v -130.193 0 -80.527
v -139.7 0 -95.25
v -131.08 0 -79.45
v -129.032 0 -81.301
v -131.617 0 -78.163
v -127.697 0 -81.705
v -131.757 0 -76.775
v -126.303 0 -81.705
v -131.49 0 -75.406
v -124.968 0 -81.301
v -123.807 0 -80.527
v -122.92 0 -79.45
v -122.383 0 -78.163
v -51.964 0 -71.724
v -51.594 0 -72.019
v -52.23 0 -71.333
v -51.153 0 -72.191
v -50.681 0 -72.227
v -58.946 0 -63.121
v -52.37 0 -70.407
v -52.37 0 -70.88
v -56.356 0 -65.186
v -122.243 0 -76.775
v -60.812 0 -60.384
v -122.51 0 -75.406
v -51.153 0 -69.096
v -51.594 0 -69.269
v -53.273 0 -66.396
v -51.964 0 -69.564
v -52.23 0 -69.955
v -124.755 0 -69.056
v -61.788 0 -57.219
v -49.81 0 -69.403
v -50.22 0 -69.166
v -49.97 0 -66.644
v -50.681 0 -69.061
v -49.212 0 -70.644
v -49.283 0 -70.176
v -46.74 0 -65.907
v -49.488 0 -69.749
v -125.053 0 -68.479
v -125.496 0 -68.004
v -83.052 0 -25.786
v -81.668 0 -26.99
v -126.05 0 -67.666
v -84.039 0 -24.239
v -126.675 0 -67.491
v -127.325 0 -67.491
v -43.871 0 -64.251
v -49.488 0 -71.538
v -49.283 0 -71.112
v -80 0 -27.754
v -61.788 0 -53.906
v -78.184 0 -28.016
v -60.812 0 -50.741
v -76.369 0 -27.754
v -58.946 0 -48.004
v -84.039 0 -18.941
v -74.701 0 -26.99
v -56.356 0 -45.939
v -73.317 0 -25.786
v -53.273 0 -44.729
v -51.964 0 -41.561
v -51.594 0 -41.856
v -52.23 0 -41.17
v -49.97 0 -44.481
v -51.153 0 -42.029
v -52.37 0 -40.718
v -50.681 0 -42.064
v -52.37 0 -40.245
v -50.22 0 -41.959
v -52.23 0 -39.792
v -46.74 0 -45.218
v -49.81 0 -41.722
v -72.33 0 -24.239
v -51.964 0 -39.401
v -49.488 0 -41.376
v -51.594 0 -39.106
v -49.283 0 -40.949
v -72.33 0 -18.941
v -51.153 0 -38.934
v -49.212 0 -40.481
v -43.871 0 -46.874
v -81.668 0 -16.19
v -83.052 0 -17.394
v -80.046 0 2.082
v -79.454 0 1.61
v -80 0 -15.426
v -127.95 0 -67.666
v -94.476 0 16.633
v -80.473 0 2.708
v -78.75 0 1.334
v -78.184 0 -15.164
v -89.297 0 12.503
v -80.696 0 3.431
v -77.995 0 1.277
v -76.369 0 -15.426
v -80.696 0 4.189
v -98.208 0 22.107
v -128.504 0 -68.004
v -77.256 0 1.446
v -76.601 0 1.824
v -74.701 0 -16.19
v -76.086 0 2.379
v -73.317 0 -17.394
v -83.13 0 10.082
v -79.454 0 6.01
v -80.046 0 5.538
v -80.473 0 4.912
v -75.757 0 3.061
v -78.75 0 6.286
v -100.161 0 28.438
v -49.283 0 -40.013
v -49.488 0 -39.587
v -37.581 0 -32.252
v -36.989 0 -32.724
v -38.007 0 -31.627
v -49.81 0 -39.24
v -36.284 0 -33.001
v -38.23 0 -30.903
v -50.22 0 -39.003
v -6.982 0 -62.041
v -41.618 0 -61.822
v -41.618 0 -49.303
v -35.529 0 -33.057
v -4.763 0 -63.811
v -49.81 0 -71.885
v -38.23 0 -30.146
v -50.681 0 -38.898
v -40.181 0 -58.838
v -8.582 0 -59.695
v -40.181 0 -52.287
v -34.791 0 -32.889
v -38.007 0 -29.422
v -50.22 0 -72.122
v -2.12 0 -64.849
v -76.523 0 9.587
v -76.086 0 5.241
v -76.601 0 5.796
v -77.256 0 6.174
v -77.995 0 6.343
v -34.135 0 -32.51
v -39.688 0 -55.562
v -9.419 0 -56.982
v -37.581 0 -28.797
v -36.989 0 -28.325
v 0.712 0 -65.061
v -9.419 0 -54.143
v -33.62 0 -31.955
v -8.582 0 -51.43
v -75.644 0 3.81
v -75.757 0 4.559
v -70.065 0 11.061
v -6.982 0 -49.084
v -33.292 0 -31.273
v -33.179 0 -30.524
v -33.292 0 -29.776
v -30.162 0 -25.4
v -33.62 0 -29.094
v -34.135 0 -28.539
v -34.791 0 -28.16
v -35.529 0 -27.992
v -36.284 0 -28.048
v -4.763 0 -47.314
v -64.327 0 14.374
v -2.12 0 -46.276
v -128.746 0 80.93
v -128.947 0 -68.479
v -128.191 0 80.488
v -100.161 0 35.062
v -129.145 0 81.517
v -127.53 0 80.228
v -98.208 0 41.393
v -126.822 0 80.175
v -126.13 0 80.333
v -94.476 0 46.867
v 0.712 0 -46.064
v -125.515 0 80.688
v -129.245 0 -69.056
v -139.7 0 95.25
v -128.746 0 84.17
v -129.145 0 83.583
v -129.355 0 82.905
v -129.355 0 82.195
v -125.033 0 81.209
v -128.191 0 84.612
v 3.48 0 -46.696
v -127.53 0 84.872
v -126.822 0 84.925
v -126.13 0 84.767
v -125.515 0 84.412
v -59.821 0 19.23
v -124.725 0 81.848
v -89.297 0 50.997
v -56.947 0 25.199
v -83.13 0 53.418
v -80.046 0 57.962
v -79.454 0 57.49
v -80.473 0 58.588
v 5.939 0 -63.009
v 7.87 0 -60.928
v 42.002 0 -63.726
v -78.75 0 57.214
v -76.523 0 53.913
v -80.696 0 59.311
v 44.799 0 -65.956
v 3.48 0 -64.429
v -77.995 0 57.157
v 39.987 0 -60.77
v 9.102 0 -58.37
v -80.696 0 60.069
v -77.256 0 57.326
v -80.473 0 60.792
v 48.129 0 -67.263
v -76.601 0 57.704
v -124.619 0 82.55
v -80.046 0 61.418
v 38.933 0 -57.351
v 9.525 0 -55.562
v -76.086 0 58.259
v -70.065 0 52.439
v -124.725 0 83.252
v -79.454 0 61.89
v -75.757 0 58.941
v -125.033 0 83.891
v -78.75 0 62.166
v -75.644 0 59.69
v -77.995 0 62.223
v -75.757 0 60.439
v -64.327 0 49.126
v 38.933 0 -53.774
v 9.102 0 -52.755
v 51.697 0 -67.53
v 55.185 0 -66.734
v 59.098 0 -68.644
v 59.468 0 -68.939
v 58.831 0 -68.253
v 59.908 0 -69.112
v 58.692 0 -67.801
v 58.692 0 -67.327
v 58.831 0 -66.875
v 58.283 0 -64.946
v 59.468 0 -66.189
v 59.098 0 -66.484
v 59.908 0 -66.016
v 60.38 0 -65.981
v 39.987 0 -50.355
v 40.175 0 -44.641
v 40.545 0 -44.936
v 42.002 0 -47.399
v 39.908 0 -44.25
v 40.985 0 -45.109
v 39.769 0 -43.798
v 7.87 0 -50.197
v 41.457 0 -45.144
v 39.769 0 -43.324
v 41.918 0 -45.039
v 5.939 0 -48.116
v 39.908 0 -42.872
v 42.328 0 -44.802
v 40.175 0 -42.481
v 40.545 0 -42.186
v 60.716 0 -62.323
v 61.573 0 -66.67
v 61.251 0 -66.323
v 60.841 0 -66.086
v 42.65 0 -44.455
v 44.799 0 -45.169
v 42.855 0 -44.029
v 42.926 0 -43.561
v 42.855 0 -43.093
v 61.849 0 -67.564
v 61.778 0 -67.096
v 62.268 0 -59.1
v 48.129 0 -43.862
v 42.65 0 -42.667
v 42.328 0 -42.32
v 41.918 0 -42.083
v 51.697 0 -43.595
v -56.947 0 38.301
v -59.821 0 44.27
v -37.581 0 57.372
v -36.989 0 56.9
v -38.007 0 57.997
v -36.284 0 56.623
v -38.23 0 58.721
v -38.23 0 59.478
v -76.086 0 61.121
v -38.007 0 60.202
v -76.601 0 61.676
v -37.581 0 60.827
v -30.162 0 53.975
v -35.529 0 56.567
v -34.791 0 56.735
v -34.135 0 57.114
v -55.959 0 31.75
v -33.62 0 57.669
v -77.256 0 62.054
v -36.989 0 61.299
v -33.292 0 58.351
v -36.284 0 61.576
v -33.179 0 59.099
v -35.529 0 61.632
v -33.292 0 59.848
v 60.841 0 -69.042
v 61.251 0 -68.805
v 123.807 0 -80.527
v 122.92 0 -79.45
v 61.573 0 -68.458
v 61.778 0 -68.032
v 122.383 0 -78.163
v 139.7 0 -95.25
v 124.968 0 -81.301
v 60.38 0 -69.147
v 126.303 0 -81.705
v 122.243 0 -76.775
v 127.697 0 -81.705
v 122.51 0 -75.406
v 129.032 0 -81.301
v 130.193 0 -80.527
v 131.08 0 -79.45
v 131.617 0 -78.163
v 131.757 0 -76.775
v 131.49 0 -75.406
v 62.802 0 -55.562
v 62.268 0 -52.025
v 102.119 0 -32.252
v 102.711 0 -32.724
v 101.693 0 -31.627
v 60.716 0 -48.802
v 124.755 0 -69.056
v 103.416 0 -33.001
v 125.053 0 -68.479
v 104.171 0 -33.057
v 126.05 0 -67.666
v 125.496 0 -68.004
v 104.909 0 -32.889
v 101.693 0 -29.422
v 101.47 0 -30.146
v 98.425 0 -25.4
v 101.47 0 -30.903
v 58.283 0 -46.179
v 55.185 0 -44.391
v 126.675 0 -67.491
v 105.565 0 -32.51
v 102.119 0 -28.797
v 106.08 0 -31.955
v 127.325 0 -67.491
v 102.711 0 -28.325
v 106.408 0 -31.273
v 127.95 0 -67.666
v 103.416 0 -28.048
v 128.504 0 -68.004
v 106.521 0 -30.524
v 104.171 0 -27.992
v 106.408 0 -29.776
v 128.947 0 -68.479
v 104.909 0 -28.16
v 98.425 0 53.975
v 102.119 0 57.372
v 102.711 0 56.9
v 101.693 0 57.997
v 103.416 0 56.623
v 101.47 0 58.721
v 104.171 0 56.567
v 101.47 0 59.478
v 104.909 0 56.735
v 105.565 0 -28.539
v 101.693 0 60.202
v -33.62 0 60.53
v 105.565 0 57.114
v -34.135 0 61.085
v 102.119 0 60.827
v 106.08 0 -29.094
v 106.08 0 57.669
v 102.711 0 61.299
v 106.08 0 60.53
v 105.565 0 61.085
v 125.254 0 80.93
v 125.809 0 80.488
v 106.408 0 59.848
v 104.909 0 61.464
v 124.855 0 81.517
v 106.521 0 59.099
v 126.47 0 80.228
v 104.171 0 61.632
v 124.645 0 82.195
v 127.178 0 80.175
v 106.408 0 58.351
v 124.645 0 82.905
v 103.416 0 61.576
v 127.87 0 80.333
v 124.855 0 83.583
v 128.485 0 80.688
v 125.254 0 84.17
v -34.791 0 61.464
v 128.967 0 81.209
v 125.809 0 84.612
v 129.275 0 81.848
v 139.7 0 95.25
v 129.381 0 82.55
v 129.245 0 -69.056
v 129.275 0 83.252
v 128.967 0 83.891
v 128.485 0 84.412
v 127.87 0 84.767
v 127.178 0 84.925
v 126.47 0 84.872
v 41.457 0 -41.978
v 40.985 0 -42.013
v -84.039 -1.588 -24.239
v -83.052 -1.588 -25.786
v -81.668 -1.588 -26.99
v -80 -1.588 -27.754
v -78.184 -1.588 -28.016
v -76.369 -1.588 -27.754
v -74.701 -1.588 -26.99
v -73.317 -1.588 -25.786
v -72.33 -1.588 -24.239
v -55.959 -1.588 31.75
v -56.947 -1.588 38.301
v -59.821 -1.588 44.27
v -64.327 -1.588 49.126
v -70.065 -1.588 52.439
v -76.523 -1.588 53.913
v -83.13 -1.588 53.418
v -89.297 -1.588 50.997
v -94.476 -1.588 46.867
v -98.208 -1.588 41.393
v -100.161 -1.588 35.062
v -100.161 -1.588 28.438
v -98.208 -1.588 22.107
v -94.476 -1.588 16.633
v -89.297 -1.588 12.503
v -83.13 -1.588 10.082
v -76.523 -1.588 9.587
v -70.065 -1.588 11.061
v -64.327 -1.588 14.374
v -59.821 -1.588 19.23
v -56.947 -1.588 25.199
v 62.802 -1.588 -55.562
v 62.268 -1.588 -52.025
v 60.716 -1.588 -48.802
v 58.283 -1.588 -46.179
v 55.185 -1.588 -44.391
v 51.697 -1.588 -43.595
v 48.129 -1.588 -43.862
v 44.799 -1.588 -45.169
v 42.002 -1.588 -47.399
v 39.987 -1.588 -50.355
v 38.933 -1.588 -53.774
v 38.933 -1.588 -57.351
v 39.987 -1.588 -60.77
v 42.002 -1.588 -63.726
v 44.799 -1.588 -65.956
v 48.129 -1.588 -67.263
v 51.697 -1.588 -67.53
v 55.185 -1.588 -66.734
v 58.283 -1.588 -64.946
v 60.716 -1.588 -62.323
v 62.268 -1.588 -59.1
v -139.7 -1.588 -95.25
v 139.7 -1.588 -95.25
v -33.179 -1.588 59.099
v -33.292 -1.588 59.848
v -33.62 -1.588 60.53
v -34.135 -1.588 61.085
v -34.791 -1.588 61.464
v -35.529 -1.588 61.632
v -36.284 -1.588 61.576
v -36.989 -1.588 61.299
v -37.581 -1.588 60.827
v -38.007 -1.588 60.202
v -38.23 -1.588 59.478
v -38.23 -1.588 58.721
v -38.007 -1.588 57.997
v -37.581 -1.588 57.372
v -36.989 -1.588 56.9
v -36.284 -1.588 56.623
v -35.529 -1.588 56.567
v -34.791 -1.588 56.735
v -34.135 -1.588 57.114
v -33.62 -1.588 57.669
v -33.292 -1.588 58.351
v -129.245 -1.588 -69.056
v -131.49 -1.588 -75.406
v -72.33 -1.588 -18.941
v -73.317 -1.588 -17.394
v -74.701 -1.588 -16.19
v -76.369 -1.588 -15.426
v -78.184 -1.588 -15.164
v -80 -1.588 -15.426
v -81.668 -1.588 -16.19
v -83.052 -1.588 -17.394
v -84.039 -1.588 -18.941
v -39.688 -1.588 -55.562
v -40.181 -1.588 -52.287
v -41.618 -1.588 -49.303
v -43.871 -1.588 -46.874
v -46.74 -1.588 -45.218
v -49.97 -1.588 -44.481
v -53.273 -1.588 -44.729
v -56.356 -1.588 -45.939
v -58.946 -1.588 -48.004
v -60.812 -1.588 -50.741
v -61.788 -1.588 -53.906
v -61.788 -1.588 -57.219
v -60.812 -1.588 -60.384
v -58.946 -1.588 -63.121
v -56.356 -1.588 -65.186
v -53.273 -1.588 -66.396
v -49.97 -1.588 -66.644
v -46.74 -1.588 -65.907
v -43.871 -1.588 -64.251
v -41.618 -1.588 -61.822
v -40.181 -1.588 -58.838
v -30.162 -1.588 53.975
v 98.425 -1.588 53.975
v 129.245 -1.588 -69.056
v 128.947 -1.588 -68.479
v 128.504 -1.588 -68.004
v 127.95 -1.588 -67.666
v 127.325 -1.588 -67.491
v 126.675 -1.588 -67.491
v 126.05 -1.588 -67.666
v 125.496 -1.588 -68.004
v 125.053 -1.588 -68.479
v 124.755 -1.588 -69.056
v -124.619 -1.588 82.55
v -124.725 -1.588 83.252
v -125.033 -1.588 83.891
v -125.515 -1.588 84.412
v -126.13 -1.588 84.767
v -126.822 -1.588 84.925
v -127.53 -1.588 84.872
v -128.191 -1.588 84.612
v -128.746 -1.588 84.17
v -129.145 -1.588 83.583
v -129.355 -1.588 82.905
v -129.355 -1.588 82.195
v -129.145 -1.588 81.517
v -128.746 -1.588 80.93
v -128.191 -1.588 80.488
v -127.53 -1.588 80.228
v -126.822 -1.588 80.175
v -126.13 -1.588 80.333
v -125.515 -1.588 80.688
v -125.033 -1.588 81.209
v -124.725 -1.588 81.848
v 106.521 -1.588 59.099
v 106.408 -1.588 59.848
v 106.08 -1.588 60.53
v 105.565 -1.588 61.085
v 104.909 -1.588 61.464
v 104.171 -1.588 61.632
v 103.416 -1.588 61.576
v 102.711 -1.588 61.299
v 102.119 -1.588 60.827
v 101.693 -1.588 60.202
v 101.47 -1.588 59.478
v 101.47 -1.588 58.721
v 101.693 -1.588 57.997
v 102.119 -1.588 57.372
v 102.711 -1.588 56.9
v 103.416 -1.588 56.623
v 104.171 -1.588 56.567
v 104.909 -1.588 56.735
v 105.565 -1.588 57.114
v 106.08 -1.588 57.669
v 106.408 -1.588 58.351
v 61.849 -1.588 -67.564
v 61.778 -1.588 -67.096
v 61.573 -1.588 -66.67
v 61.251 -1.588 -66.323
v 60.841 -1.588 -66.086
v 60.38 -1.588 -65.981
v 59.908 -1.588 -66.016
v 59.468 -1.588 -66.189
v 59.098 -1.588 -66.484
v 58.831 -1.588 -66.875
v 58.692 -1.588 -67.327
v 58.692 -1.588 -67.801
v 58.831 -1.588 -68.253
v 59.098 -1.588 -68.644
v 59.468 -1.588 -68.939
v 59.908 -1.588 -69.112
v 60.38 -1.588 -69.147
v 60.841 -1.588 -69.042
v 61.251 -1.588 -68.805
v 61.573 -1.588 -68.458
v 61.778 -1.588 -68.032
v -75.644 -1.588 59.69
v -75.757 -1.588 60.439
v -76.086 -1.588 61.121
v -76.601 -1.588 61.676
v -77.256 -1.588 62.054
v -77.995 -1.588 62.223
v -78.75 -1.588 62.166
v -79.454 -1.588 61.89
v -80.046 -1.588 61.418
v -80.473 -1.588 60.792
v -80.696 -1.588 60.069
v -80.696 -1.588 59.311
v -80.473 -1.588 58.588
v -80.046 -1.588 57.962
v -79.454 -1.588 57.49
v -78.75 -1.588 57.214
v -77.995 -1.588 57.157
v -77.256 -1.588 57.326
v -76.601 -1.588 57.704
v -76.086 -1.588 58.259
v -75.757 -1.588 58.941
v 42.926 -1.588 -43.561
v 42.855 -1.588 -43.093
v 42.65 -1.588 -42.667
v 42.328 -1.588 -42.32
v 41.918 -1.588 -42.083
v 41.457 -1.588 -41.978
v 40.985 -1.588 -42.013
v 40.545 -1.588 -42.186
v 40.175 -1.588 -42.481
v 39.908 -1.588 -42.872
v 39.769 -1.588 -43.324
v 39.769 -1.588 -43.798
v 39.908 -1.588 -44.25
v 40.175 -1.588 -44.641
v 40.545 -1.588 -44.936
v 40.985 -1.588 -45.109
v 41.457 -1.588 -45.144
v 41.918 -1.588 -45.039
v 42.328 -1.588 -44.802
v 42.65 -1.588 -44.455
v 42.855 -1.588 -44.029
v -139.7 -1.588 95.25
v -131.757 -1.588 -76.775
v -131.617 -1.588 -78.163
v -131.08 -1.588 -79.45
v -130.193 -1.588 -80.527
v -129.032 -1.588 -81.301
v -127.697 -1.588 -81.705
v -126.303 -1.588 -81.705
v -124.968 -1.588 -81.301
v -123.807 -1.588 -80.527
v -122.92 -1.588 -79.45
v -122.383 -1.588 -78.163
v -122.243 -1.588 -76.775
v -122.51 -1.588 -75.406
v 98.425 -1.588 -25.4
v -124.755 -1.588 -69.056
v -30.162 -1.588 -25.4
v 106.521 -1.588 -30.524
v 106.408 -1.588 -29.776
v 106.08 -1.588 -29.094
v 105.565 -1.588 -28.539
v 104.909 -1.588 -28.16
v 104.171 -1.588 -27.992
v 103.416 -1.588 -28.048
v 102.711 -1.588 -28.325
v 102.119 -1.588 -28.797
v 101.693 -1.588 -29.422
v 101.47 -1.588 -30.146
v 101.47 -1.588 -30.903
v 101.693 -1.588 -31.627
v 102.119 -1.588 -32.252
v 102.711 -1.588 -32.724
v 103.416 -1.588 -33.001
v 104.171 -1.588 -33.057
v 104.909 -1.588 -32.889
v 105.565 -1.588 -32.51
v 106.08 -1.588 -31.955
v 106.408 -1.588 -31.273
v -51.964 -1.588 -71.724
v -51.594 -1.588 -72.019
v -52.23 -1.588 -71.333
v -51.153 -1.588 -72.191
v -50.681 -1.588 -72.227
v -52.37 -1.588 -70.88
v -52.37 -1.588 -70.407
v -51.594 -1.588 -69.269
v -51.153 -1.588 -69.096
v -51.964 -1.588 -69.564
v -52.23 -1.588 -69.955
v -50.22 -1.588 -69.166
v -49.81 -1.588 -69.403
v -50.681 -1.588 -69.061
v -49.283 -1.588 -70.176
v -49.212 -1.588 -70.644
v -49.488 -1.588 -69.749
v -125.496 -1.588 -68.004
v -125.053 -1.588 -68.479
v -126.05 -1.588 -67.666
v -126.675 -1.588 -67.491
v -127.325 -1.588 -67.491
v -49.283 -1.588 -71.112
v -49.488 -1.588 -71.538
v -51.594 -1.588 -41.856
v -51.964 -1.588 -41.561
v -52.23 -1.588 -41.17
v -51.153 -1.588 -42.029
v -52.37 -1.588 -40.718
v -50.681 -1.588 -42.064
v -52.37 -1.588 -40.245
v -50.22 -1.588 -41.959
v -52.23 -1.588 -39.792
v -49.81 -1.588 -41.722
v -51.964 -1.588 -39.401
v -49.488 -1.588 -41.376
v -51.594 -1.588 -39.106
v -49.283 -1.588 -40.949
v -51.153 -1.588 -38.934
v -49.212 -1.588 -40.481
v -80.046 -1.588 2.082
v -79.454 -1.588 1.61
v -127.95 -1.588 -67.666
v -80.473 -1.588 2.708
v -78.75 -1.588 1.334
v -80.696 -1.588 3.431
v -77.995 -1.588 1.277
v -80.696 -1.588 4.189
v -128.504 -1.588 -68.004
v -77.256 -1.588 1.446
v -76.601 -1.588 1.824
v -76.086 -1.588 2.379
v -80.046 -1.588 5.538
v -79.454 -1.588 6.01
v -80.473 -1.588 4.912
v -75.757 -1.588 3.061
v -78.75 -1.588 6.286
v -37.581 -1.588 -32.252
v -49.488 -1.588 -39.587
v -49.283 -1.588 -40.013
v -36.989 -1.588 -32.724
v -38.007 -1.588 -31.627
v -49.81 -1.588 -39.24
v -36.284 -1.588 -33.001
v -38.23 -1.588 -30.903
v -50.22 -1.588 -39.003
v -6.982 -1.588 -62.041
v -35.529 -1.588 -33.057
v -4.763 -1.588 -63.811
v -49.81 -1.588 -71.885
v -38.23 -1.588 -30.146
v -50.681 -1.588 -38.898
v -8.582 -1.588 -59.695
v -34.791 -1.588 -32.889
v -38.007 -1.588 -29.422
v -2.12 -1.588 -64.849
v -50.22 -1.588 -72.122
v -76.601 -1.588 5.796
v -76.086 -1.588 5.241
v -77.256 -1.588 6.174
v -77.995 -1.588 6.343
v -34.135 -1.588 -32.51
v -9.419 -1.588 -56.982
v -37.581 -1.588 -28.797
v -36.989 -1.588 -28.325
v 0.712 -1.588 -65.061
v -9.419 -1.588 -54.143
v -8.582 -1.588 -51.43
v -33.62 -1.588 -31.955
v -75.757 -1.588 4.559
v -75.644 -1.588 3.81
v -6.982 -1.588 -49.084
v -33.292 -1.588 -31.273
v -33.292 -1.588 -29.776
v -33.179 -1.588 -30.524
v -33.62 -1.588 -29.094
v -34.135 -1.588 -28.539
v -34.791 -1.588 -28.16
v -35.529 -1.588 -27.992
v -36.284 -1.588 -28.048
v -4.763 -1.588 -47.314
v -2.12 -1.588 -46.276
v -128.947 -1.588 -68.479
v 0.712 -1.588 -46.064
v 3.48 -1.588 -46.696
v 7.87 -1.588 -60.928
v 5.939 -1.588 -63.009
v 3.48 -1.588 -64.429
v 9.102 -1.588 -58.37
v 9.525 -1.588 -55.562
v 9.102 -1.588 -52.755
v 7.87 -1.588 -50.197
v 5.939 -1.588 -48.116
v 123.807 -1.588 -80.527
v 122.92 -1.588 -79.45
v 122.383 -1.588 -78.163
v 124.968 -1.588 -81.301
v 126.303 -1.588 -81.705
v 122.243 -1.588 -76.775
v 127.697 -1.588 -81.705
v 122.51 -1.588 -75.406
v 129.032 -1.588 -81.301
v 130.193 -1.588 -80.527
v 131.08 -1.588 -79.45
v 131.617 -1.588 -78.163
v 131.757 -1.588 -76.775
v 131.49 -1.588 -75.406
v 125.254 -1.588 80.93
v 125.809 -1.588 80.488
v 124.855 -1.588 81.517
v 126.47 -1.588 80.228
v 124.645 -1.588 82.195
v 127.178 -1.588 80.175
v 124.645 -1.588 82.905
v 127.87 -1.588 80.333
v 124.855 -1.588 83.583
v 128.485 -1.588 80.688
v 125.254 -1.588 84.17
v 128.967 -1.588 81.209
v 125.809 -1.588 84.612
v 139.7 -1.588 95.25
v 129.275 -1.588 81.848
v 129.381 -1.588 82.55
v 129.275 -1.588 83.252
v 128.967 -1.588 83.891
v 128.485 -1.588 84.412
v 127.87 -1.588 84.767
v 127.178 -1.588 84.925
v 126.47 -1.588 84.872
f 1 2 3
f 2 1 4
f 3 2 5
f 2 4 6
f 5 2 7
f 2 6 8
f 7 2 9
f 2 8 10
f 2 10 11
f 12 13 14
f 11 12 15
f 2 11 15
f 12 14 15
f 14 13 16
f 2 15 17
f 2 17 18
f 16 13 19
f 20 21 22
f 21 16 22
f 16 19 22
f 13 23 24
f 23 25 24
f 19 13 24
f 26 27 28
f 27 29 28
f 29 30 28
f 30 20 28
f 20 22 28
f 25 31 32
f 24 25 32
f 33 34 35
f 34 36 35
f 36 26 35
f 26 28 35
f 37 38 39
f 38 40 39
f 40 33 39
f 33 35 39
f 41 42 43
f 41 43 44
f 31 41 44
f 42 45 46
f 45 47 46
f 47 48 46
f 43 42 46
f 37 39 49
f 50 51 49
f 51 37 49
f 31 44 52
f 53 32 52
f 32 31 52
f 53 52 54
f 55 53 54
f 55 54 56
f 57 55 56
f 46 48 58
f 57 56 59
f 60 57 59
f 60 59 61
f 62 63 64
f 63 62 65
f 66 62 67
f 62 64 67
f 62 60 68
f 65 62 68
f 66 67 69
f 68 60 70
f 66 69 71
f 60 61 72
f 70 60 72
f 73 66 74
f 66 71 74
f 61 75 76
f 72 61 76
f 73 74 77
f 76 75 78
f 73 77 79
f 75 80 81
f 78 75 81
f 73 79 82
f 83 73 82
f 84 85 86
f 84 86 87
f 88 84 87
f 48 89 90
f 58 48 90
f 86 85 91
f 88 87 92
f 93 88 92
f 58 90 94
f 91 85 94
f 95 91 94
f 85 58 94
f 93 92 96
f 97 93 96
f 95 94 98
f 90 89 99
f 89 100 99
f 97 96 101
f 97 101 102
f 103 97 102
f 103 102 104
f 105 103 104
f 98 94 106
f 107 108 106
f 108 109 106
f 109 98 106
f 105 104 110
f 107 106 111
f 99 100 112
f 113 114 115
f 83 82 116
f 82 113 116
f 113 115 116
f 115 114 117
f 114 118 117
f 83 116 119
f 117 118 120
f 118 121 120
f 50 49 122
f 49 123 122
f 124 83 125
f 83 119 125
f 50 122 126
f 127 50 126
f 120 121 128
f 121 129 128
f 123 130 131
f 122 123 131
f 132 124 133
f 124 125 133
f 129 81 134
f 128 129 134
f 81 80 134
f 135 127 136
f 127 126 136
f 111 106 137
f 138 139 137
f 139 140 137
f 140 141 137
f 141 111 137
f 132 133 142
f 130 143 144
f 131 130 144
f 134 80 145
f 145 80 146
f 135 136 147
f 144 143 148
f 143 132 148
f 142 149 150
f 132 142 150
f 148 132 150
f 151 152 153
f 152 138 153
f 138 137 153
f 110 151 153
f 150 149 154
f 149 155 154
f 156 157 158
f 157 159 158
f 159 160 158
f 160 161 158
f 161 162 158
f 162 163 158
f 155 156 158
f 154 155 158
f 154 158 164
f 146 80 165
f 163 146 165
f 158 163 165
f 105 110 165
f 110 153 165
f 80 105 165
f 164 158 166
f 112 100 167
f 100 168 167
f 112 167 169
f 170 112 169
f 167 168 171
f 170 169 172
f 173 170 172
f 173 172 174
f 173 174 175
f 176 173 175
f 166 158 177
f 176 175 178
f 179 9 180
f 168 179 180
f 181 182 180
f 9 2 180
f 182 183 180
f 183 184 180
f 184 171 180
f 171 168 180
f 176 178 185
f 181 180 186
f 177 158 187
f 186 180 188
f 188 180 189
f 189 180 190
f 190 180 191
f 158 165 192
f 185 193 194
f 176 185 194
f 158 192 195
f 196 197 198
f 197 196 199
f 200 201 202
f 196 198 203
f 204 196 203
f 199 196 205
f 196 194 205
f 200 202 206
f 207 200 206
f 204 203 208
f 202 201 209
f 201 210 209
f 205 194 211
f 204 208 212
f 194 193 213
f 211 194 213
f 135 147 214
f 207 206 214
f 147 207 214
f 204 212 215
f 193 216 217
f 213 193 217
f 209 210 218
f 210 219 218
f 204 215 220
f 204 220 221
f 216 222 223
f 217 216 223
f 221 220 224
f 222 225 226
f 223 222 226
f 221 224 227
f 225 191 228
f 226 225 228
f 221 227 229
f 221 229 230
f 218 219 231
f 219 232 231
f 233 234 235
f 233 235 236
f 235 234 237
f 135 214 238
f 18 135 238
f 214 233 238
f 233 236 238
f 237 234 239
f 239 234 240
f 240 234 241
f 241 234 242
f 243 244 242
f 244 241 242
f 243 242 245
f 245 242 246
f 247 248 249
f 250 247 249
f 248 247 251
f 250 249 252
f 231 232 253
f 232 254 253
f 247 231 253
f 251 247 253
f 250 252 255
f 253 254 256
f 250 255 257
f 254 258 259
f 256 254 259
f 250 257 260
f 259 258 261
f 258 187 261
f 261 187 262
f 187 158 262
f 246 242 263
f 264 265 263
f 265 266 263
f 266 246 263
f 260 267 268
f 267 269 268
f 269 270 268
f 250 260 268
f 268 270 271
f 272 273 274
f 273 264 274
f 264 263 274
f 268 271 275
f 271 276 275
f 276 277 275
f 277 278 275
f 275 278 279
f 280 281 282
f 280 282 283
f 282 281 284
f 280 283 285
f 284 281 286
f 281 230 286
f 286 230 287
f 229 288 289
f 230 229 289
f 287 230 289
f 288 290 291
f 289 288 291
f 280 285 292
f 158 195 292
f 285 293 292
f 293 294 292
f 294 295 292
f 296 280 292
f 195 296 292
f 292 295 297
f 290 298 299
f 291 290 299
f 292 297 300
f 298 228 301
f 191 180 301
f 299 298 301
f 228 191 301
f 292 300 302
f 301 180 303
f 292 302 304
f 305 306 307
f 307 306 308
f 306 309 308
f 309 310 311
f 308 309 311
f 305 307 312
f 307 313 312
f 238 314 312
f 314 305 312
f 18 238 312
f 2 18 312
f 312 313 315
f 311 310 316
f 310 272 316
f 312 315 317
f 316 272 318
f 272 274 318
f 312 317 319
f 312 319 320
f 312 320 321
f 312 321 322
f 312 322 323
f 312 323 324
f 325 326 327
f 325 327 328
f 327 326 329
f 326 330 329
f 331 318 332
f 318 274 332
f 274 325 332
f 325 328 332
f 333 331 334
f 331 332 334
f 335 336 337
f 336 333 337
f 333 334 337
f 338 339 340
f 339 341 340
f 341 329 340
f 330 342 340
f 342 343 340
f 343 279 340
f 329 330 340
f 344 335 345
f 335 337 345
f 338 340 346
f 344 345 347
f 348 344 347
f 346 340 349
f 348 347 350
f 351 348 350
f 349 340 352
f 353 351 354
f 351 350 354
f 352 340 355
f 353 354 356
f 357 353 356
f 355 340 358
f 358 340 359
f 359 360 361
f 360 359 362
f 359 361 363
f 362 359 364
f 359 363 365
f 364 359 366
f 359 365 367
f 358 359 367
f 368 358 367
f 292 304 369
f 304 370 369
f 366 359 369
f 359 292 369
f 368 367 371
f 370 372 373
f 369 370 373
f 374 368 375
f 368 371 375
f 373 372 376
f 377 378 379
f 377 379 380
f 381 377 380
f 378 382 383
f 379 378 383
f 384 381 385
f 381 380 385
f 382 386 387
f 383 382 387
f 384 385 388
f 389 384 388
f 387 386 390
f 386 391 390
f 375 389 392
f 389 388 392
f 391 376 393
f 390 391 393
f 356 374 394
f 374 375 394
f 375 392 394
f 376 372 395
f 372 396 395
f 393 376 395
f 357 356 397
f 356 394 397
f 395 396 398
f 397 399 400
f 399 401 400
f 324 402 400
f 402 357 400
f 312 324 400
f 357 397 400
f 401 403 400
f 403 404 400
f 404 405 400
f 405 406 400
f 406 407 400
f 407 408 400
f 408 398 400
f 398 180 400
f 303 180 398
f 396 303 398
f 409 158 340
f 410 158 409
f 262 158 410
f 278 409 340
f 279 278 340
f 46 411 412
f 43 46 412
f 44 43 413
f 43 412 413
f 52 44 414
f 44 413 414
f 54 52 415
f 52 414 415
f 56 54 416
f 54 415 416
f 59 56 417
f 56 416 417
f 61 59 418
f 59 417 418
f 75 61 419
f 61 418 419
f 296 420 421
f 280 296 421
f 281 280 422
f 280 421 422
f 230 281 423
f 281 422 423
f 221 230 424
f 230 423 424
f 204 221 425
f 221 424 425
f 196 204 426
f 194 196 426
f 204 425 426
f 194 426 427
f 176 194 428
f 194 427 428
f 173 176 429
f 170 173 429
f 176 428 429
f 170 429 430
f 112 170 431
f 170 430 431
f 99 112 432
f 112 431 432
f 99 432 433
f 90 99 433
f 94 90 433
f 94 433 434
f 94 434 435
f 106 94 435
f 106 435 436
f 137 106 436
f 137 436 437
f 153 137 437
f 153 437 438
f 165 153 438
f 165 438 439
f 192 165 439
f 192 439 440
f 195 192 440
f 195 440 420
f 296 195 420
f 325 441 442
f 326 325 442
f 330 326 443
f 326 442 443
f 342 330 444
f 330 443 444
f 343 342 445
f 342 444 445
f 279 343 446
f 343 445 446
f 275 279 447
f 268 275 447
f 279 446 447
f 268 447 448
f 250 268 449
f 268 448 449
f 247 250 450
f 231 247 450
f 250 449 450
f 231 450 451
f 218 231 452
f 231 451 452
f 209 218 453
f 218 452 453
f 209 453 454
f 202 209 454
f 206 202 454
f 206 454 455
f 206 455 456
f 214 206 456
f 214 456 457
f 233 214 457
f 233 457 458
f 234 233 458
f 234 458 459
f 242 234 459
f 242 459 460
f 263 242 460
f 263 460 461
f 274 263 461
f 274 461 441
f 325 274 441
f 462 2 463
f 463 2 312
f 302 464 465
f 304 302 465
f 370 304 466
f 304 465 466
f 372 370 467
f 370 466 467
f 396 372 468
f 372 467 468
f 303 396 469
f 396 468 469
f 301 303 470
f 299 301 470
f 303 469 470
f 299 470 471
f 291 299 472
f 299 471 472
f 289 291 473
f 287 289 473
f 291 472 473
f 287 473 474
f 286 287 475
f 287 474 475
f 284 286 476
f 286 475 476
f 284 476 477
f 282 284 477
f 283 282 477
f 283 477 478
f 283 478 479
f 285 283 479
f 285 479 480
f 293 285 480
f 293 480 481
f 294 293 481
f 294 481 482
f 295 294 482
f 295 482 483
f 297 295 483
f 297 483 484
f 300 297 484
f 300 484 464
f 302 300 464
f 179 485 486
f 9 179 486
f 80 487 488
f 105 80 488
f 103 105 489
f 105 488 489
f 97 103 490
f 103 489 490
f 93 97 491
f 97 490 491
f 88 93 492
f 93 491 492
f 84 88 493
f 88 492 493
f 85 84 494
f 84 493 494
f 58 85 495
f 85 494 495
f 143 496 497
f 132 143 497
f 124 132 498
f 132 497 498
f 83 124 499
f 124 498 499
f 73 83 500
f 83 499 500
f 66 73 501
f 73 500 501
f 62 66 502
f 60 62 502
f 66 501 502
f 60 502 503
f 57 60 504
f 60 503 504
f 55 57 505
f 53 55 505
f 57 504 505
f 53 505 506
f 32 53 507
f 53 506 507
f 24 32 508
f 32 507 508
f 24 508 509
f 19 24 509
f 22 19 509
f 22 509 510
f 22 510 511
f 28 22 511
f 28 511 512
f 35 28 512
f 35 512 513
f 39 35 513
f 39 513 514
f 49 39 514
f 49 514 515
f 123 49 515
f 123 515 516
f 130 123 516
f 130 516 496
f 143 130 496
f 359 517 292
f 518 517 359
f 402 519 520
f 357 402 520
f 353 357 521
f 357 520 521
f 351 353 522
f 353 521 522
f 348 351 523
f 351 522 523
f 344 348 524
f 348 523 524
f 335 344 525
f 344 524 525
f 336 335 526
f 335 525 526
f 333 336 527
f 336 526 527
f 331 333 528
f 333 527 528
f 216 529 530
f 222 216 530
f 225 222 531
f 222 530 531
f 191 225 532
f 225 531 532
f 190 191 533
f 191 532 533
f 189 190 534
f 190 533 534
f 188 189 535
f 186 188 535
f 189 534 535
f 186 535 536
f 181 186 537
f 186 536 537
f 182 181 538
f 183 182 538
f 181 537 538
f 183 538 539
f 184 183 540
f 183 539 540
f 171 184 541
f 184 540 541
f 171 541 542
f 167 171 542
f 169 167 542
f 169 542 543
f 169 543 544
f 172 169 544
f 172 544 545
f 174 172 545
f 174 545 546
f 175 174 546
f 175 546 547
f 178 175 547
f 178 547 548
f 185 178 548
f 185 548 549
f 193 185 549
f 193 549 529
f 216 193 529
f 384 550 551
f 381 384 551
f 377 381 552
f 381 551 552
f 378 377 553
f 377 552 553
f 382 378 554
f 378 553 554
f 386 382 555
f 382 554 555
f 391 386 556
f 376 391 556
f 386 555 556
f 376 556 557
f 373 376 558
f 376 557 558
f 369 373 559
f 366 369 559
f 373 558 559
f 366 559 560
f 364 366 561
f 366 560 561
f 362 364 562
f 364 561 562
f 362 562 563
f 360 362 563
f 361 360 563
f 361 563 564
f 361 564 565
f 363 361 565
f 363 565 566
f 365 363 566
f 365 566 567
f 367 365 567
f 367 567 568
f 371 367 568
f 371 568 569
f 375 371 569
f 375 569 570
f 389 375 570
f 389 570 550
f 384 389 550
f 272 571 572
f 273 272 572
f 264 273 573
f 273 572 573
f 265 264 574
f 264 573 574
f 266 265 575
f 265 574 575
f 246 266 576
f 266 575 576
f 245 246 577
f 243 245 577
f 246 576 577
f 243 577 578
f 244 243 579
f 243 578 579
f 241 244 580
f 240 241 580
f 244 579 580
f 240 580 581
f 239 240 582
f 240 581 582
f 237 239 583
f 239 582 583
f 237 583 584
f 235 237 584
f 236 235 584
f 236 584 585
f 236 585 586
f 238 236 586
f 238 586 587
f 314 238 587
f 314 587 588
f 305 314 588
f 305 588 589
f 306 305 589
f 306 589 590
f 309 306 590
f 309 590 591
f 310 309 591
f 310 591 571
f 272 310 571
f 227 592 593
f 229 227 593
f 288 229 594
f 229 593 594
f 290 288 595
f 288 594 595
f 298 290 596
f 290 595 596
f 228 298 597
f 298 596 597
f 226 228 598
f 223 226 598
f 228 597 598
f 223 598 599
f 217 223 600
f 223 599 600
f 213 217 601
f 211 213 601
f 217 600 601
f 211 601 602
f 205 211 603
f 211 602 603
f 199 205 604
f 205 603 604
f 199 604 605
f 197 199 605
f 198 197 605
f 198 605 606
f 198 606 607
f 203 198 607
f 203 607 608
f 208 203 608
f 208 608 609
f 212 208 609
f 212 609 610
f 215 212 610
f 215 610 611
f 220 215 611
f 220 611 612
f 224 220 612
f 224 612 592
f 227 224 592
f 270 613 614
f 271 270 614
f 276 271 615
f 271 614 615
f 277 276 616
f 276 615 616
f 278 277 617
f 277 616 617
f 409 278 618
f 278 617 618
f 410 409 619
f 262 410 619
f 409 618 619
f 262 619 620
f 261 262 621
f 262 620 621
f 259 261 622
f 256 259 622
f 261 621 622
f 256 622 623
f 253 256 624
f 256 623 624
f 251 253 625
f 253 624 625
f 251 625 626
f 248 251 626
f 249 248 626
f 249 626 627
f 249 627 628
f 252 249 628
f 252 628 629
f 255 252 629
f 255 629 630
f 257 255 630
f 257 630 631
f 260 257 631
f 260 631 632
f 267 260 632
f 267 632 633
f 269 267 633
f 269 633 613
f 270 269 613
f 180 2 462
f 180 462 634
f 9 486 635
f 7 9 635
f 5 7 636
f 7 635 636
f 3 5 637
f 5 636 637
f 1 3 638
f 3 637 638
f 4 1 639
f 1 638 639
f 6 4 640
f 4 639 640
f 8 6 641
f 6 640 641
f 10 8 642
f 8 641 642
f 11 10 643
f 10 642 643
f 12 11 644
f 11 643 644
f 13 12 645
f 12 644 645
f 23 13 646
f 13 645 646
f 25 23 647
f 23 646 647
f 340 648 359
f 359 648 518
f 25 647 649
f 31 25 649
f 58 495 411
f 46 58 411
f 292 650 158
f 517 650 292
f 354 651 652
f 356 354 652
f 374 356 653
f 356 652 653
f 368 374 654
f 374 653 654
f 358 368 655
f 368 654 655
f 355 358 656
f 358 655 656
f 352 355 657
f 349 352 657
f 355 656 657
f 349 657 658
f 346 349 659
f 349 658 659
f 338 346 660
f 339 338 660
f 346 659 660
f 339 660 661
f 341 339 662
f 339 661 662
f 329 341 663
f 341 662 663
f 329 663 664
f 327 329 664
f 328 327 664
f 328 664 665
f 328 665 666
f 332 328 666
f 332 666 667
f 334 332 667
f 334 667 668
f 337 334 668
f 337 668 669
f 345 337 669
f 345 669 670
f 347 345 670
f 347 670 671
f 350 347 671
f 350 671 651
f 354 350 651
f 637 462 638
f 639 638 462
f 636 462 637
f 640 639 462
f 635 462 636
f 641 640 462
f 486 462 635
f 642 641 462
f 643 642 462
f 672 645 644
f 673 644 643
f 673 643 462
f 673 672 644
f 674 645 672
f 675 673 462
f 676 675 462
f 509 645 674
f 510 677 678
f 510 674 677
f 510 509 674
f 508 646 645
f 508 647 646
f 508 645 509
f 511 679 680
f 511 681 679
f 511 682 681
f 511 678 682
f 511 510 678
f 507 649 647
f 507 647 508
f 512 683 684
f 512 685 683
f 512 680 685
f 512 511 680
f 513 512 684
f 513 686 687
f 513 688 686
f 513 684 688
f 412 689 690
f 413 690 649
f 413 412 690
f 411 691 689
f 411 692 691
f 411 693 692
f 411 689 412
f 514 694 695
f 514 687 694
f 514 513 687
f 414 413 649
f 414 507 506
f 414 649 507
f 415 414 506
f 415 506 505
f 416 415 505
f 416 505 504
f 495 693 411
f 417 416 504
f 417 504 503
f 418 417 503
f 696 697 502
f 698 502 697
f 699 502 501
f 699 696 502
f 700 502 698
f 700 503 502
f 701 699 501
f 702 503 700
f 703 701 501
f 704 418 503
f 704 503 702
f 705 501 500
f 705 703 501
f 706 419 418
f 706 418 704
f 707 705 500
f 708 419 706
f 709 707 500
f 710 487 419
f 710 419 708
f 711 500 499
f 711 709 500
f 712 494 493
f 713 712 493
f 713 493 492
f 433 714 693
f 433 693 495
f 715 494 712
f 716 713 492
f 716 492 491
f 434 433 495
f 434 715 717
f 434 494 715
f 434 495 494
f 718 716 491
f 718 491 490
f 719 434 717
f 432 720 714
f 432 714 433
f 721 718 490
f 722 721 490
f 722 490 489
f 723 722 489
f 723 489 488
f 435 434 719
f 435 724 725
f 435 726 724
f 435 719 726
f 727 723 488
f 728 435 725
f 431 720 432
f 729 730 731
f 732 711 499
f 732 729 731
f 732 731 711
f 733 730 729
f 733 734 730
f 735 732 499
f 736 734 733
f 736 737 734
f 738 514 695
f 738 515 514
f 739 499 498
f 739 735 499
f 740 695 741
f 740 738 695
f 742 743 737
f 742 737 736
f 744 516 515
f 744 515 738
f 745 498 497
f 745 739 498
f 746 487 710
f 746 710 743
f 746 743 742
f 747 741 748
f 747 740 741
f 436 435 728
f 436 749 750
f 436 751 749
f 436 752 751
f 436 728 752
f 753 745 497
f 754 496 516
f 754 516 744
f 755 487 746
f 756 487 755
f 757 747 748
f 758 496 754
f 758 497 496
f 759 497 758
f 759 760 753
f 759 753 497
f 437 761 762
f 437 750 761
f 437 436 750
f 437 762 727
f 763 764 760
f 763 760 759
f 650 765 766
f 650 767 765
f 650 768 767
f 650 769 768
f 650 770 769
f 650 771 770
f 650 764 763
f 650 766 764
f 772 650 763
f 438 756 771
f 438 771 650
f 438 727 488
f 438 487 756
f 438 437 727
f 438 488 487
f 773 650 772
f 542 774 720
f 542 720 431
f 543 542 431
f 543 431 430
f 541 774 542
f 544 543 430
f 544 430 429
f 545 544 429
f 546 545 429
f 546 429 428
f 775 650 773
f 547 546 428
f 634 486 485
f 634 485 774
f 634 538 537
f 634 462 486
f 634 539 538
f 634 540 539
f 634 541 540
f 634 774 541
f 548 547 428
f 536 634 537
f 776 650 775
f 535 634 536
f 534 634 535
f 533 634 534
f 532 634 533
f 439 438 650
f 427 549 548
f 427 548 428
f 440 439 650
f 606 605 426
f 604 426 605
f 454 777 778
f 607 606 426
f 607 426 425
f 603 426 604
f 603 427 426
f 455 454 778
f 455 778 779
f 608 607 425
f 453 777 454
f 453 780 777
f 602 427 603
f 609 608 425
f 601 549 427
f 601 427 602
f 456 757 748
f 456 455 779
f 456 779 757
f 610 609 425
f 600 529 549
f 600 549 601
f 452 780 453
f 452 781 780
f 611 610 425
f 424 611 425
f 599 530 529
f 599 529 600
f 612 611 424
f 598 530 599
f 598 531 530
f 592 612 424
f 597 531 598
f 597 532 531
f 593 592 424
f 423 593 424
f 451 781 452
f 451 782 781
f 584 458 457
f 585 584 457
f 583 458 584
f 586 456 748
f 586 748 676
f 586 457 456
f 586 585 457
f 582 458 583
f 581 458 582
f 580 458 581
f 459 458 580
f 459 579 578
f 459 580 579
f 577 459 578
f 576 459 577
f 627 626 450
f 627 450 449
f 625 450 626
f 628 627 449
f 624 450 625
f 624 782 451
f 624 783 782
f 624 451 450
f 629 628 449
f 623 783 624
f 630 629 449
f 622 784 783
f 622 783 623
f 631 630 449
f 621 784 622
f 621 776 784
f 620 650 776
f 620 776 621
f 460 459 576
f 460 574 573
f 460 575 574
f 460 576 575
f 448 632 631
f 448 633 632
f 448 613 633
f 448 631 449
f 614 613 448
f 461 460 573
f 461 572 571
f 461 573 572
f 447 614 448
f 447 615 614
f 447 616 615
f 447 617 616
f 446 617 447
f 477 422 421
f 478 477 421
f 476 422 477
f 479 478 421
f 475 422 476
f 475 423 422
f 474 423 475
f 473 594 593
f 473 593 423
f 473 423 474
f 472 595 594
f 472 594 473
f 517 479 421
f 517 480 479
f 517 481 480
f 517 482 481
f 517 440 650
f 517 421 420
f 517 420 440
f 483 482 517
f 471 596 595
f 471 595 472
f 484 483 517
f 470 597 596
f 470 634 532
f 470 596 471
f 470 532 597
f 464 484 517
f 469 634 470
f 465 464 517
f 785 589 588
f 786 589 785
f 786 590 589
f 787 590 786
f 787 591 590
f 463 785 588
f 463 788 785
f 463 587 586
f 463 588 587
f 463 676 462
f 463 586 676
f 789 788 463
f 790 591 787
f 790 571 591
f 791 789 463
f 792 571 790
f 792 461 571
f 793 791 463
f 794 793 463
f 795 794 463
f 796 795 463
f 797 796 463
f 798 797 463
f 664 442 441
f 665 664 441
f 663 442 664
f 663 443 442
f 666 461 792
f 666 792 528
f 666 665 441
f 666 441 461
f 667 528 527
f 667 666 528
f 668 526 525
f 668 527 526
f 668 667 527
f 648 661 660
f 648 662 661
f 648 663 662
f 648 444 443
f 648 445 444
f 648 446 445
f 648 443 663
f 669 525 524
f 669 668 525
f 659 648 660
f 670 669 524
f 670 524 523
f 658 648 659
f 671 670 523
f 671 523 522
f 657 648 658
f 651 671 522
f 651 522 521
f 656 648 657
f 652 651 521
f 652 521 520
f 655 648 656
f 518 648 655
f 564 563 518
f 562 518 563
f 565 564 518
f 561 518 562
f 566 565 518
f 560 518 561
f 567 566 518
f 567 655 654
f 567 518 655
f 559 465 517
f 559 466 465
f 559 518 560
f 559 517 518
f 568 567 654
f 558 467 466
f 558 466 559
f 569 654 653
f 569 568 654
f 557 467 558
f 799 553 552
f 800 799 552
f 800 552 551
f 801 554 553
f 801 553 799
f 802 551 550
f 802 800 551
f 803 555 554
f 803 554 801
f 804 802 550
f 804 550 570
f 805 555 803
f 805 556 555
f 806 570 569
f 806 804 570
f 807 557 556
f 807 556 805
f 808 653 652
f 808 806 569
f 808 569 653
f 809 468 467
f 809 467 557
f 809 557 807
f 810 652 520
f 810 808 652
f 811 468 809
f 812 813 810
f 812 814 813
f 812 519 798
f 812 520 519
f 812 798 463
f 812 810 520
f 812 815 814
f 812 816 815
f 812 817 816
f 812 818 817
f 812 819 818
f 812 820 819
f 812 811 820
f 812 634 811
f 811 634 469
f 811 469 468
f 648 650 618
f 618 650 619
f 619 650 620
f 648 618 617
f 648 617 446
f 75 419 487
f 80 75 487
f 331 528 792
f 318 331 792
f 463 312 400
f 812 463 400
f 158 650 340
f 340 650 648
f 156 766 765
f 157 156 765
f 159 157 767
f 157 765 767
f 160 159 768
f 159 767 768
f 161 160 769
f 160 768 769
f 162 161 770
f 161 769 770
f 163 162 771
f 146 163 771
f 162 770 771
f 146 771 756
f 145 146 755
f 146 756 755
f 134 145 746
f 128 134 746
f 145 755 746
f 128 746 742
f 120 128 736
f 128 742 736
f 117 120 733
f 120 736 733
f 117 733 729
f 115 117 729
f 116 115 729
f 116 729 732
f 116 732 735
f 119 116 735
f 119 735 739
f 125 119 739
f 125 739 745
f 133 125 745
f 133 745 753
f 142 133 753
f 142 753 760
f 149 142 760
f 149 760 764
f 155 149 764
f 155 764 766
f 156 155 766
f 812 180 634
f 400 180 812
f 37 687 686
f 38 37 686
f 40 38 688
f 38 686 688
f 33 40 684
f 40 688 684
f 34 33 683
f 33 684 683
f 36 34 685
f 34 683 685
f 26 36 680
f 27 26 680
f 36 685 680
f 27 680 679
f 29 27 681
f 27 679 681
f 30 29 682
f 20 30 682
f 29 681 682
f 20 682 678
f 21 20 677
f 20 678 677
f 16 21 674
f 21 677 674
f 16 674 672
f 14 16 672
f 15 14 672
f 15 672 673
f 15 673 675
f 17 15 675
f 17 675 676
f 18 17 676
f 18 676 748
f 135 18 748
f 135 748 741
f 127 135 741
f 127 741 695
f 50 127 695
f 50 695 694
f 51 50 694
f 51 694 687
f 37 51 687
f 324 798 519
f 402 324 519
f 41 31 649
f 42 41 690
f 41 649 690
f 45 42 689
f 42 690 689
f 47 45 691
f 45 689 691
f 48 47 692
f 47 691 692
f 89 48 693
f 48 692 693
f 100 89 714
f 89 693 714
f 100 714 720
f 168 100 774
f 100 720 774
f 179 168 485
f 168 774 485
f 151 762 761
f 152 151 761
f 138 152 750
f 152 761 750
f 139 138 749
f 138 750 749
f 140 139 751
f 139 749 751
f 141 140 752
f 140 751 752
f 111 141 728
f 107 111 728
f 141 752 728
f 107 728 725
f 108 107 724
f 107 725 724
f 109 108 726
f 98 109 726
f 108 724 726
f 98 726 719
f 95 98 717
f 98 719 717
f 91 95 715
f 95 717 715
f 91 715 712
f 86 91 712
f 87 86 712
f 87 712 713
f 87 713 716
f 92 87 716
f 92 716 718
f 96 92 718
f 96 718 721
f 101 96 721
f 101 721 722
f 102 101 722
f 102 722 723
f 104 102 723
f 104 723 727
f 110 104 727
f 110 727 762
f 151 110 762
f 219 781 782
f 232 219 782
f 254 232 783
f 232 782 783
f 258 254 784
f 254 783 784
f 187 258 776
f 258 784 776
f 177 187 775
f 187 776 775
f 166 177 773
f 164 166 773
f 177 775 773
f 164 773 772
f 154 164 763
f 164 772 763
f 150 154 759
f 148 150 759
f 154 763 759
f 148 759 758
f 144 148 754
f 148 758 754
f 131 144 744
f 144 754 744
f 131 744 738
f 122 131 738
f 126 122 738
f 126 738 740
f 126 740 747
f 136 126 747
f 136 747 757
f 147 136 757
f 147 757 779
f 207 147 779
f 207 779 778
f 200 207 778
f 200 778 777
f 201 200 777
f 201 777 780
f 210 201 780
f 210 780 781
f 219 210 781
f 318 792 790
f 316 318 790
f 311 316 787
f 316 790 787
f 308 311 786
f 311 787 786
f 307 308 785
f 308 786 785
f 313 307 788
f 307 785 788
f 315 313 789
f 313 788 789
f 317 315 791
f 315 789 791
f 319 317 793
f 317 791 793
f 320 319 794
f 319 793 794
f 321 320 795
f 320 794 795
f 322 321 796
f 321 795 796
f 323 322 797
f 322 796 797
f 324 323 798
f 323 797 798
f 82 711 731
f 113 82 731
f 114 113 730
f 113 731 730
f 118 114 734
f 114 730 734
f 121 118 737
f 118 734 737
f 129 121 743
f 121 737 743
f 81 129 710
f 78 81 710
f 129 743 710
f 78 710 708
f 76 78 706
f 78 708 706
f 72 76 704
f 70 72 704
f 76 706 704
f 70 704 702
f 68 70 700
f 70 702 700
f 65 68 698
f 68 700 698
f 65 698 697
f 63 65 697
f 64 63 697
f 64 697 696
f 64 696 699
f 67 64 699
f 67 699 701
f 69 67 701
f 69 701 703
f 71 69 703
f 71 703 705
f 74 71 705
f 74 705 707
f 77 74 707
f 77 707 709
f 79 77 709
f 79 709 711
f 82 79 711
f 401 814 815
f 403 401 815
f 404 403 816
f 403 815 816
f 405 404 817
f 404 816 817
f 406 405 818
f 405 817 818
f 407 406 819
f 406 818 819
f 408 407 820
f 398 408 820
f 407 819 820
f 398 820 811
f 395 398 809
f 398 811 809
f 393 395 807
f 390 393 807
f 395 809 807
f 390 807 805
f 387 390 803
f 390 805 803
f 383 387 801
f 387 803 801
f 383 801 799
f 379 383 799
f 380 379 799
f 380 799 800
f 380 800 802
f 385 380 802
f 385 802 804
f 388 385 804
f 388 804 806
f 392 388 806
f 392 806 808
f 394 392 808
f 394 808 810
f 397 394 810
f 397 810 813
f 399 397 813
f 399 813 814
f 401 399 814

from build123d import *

# Parameters (mm, degrees)
F0_W     = 279.4
F0_H     = 190.5
F1_DEPTH = 1.5875
F2_W     = 128.5875
F2_H     = 79.375
F2_R     = 2.54
F3_DEPTH = 25.4
F4_R     = 22.225
F4_R_2   = 2.54
F5_DEPTH = 25.4
F6_R     = 12.0015
F6_R_2   = 1.5875
F6_R_3   = 9.525
F6_R_4   = 11.1125
F7_DEPTH = 25.4
F8_R     = 2.38125
F9_DEPTH = 25.4


with BuildPart() as f1:
    # F0 (on Front) → F1 (new body)
    with BuildSketch(Plane.XZ):
        Rectangle(F0_W, F0_H)
    extrude(amount=F1_DEPTH)

    # F2 (on face) → F3 (cut)
    with BuildSketch(Plane.XZ.offset(1.5875)):
        with Locations((34.13125, 14.2875)):
            Rectangle(F2_W, F2_H)
        with Locations((-35.71875, 59.09945)):
            Circle(F2_R)
        with Locations((103.98125, 59.09945)):
            Circle(F2_R)
        with Locations((103.98125, -30.52445)):
            Circle(F2_R)
        with Locations((-35.71875, -30.52445)):
            Circle(F2_R)
    extrude(amount=-F3_DEPTH, mode=Mode.SUBTRACT)

    # F4 (on face) → F5 (cut)
    with BuildSketch(Plane.XZ.offset(1.5875)):
        with Locations((-78.184375, 31.75)):
            Circle(F4_R)
        with Locations((-78.184375, 59.69)):
            Circle(F4_R_2)
        with Locations((-78.184375, 3.81)):
            Circle(F4_R_2)
    extrude(amount=-F5_DEPTH, mode=Mode.SUBTRACT)

    # F6 (on face) → F7 (cut)
    with BuildSketch(Plane.XZ.offset(1.5875)):
        with Locations((50.8, -55.5625)):
            Circle(F6_R)
        with Locations((41.3385, -43.561)):
            Circle(F6_R_2)
        with Locations((60.2615, -67.564)):
            Circle(F6_R_2)
        with Locations((0, -55.5625)):
            Circle(F6_R_3)
        with BuildLine():
            Line((-84.039075, -18.940748), (-84.039075, -24.239252))
            ThreePointArc((-84.039075, -24.239252), (-78.184375, -28.0162), (-72.329675, -24.239252))
            Line((-72.329675, -24.239252), (-72.329675, -18.940748))
            ThreePointArc((-72.329675, -18.940748), (-78.184375, -15.1638), (-84.039075, -18.940748))
        make_face()
        with Locations((-50.8, -55.5625)):
            Circle(F6_R_4)
        with Locations((-50.8, -40.48125)):
            Circle(F6_R_2)
        with Locations((-50.8, -70.64375)):
            Circle(F6_R_2)
    extrude(amount=-F7_DEPTH, mode=Mode.SUBTRACT)

    # F8 (on face) → F9 (cut)
    with BuildSketch(Plane.XZ.offset(1.5875)):
        with Locations((-127, 82.55)):
            Circle(F8_R)
        with Locations((127, 82.55)):
            Circle(F8_R)
        with BuildLine():
            Line((-122.509872, -75.40625), (-124.754936, -69.05625))
            ThreePointArc((-124.754936, -69.05625), (-127, -67.46875), (-129.245064, -69.05625))
            Line((-129.245064, -69.05625), (-131.490128, -75.40625))
            ThreePointArc((-131.490128, -75.40625), (-127, -81.75625), (-122.509872, -75.40625))
        make_face()
        with BuildLine():
            Line((131.490128, -75.40625), (129.245064, -69.05625))
            ThreePointArc((129.245064, -69.05625), (127, -67.46875), (124.754936, -69.05625))
            Line((124.754936, -69.05625), (122.509872, -75.40625))
            ThreePointArc((122.509872, -75.40625), (127, -81.75625), (131.490128, -75.40625))
        make_face()
    extrude(amount=-F9_DEPTH, mode=Mode.SUBTRACT)


solid = f1.part
